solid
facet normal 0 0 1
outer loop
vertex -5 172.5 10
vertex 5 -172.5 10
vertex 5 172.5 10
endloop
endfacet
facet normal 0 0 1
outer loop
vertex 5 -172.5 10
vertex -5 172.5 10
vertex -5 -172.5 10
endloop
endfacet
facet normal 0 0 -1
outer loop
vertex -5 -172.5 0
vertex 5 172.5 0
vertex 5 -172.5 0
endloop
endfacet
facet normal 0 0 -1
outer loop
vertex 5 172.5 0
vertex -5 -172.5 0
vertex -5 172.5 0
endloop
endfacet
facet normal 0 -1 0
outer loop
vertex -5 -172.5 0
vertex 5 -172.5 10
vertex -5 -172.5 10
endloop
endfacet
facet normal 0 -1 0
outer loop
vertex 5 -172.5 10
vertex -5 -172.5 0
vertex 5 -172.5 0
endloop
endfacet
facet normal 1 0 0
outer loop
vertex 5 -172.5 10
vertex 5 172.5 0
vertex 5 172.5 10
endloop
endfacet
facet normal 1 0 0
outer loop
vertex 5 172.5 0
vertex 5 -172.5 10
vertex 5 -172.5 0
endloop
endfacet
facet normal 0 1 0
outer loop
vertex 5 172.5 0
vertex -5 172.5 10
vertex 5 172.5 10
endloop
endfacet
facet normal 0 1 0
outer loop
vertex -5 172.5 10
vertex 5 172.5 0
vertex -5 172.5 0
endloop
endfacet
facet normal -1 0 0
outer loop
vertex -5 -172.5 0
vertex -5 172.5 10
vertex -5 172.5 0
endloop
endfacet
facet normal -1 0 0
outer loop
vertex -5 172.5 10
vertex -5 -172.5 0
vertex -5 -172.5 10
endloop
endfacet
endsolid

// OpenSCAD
/* ==========================================================================
   PROJETO CAMPO TÁTIL - EIXO METÁLICO Y (hardware comprado)
   Representação 3D do Eixo de Aço Y de 10x10x345mm para montagem/fatiamento
   ========================================================================== */

$fn = 60;

module barra_quadrada_y() {
    color("silver")
        cube([10, 345, 10], center=true);
}

// Renderiza centralizado no plano Z=0
translate([0, 0, 5])
    barra_quadrada_y();
